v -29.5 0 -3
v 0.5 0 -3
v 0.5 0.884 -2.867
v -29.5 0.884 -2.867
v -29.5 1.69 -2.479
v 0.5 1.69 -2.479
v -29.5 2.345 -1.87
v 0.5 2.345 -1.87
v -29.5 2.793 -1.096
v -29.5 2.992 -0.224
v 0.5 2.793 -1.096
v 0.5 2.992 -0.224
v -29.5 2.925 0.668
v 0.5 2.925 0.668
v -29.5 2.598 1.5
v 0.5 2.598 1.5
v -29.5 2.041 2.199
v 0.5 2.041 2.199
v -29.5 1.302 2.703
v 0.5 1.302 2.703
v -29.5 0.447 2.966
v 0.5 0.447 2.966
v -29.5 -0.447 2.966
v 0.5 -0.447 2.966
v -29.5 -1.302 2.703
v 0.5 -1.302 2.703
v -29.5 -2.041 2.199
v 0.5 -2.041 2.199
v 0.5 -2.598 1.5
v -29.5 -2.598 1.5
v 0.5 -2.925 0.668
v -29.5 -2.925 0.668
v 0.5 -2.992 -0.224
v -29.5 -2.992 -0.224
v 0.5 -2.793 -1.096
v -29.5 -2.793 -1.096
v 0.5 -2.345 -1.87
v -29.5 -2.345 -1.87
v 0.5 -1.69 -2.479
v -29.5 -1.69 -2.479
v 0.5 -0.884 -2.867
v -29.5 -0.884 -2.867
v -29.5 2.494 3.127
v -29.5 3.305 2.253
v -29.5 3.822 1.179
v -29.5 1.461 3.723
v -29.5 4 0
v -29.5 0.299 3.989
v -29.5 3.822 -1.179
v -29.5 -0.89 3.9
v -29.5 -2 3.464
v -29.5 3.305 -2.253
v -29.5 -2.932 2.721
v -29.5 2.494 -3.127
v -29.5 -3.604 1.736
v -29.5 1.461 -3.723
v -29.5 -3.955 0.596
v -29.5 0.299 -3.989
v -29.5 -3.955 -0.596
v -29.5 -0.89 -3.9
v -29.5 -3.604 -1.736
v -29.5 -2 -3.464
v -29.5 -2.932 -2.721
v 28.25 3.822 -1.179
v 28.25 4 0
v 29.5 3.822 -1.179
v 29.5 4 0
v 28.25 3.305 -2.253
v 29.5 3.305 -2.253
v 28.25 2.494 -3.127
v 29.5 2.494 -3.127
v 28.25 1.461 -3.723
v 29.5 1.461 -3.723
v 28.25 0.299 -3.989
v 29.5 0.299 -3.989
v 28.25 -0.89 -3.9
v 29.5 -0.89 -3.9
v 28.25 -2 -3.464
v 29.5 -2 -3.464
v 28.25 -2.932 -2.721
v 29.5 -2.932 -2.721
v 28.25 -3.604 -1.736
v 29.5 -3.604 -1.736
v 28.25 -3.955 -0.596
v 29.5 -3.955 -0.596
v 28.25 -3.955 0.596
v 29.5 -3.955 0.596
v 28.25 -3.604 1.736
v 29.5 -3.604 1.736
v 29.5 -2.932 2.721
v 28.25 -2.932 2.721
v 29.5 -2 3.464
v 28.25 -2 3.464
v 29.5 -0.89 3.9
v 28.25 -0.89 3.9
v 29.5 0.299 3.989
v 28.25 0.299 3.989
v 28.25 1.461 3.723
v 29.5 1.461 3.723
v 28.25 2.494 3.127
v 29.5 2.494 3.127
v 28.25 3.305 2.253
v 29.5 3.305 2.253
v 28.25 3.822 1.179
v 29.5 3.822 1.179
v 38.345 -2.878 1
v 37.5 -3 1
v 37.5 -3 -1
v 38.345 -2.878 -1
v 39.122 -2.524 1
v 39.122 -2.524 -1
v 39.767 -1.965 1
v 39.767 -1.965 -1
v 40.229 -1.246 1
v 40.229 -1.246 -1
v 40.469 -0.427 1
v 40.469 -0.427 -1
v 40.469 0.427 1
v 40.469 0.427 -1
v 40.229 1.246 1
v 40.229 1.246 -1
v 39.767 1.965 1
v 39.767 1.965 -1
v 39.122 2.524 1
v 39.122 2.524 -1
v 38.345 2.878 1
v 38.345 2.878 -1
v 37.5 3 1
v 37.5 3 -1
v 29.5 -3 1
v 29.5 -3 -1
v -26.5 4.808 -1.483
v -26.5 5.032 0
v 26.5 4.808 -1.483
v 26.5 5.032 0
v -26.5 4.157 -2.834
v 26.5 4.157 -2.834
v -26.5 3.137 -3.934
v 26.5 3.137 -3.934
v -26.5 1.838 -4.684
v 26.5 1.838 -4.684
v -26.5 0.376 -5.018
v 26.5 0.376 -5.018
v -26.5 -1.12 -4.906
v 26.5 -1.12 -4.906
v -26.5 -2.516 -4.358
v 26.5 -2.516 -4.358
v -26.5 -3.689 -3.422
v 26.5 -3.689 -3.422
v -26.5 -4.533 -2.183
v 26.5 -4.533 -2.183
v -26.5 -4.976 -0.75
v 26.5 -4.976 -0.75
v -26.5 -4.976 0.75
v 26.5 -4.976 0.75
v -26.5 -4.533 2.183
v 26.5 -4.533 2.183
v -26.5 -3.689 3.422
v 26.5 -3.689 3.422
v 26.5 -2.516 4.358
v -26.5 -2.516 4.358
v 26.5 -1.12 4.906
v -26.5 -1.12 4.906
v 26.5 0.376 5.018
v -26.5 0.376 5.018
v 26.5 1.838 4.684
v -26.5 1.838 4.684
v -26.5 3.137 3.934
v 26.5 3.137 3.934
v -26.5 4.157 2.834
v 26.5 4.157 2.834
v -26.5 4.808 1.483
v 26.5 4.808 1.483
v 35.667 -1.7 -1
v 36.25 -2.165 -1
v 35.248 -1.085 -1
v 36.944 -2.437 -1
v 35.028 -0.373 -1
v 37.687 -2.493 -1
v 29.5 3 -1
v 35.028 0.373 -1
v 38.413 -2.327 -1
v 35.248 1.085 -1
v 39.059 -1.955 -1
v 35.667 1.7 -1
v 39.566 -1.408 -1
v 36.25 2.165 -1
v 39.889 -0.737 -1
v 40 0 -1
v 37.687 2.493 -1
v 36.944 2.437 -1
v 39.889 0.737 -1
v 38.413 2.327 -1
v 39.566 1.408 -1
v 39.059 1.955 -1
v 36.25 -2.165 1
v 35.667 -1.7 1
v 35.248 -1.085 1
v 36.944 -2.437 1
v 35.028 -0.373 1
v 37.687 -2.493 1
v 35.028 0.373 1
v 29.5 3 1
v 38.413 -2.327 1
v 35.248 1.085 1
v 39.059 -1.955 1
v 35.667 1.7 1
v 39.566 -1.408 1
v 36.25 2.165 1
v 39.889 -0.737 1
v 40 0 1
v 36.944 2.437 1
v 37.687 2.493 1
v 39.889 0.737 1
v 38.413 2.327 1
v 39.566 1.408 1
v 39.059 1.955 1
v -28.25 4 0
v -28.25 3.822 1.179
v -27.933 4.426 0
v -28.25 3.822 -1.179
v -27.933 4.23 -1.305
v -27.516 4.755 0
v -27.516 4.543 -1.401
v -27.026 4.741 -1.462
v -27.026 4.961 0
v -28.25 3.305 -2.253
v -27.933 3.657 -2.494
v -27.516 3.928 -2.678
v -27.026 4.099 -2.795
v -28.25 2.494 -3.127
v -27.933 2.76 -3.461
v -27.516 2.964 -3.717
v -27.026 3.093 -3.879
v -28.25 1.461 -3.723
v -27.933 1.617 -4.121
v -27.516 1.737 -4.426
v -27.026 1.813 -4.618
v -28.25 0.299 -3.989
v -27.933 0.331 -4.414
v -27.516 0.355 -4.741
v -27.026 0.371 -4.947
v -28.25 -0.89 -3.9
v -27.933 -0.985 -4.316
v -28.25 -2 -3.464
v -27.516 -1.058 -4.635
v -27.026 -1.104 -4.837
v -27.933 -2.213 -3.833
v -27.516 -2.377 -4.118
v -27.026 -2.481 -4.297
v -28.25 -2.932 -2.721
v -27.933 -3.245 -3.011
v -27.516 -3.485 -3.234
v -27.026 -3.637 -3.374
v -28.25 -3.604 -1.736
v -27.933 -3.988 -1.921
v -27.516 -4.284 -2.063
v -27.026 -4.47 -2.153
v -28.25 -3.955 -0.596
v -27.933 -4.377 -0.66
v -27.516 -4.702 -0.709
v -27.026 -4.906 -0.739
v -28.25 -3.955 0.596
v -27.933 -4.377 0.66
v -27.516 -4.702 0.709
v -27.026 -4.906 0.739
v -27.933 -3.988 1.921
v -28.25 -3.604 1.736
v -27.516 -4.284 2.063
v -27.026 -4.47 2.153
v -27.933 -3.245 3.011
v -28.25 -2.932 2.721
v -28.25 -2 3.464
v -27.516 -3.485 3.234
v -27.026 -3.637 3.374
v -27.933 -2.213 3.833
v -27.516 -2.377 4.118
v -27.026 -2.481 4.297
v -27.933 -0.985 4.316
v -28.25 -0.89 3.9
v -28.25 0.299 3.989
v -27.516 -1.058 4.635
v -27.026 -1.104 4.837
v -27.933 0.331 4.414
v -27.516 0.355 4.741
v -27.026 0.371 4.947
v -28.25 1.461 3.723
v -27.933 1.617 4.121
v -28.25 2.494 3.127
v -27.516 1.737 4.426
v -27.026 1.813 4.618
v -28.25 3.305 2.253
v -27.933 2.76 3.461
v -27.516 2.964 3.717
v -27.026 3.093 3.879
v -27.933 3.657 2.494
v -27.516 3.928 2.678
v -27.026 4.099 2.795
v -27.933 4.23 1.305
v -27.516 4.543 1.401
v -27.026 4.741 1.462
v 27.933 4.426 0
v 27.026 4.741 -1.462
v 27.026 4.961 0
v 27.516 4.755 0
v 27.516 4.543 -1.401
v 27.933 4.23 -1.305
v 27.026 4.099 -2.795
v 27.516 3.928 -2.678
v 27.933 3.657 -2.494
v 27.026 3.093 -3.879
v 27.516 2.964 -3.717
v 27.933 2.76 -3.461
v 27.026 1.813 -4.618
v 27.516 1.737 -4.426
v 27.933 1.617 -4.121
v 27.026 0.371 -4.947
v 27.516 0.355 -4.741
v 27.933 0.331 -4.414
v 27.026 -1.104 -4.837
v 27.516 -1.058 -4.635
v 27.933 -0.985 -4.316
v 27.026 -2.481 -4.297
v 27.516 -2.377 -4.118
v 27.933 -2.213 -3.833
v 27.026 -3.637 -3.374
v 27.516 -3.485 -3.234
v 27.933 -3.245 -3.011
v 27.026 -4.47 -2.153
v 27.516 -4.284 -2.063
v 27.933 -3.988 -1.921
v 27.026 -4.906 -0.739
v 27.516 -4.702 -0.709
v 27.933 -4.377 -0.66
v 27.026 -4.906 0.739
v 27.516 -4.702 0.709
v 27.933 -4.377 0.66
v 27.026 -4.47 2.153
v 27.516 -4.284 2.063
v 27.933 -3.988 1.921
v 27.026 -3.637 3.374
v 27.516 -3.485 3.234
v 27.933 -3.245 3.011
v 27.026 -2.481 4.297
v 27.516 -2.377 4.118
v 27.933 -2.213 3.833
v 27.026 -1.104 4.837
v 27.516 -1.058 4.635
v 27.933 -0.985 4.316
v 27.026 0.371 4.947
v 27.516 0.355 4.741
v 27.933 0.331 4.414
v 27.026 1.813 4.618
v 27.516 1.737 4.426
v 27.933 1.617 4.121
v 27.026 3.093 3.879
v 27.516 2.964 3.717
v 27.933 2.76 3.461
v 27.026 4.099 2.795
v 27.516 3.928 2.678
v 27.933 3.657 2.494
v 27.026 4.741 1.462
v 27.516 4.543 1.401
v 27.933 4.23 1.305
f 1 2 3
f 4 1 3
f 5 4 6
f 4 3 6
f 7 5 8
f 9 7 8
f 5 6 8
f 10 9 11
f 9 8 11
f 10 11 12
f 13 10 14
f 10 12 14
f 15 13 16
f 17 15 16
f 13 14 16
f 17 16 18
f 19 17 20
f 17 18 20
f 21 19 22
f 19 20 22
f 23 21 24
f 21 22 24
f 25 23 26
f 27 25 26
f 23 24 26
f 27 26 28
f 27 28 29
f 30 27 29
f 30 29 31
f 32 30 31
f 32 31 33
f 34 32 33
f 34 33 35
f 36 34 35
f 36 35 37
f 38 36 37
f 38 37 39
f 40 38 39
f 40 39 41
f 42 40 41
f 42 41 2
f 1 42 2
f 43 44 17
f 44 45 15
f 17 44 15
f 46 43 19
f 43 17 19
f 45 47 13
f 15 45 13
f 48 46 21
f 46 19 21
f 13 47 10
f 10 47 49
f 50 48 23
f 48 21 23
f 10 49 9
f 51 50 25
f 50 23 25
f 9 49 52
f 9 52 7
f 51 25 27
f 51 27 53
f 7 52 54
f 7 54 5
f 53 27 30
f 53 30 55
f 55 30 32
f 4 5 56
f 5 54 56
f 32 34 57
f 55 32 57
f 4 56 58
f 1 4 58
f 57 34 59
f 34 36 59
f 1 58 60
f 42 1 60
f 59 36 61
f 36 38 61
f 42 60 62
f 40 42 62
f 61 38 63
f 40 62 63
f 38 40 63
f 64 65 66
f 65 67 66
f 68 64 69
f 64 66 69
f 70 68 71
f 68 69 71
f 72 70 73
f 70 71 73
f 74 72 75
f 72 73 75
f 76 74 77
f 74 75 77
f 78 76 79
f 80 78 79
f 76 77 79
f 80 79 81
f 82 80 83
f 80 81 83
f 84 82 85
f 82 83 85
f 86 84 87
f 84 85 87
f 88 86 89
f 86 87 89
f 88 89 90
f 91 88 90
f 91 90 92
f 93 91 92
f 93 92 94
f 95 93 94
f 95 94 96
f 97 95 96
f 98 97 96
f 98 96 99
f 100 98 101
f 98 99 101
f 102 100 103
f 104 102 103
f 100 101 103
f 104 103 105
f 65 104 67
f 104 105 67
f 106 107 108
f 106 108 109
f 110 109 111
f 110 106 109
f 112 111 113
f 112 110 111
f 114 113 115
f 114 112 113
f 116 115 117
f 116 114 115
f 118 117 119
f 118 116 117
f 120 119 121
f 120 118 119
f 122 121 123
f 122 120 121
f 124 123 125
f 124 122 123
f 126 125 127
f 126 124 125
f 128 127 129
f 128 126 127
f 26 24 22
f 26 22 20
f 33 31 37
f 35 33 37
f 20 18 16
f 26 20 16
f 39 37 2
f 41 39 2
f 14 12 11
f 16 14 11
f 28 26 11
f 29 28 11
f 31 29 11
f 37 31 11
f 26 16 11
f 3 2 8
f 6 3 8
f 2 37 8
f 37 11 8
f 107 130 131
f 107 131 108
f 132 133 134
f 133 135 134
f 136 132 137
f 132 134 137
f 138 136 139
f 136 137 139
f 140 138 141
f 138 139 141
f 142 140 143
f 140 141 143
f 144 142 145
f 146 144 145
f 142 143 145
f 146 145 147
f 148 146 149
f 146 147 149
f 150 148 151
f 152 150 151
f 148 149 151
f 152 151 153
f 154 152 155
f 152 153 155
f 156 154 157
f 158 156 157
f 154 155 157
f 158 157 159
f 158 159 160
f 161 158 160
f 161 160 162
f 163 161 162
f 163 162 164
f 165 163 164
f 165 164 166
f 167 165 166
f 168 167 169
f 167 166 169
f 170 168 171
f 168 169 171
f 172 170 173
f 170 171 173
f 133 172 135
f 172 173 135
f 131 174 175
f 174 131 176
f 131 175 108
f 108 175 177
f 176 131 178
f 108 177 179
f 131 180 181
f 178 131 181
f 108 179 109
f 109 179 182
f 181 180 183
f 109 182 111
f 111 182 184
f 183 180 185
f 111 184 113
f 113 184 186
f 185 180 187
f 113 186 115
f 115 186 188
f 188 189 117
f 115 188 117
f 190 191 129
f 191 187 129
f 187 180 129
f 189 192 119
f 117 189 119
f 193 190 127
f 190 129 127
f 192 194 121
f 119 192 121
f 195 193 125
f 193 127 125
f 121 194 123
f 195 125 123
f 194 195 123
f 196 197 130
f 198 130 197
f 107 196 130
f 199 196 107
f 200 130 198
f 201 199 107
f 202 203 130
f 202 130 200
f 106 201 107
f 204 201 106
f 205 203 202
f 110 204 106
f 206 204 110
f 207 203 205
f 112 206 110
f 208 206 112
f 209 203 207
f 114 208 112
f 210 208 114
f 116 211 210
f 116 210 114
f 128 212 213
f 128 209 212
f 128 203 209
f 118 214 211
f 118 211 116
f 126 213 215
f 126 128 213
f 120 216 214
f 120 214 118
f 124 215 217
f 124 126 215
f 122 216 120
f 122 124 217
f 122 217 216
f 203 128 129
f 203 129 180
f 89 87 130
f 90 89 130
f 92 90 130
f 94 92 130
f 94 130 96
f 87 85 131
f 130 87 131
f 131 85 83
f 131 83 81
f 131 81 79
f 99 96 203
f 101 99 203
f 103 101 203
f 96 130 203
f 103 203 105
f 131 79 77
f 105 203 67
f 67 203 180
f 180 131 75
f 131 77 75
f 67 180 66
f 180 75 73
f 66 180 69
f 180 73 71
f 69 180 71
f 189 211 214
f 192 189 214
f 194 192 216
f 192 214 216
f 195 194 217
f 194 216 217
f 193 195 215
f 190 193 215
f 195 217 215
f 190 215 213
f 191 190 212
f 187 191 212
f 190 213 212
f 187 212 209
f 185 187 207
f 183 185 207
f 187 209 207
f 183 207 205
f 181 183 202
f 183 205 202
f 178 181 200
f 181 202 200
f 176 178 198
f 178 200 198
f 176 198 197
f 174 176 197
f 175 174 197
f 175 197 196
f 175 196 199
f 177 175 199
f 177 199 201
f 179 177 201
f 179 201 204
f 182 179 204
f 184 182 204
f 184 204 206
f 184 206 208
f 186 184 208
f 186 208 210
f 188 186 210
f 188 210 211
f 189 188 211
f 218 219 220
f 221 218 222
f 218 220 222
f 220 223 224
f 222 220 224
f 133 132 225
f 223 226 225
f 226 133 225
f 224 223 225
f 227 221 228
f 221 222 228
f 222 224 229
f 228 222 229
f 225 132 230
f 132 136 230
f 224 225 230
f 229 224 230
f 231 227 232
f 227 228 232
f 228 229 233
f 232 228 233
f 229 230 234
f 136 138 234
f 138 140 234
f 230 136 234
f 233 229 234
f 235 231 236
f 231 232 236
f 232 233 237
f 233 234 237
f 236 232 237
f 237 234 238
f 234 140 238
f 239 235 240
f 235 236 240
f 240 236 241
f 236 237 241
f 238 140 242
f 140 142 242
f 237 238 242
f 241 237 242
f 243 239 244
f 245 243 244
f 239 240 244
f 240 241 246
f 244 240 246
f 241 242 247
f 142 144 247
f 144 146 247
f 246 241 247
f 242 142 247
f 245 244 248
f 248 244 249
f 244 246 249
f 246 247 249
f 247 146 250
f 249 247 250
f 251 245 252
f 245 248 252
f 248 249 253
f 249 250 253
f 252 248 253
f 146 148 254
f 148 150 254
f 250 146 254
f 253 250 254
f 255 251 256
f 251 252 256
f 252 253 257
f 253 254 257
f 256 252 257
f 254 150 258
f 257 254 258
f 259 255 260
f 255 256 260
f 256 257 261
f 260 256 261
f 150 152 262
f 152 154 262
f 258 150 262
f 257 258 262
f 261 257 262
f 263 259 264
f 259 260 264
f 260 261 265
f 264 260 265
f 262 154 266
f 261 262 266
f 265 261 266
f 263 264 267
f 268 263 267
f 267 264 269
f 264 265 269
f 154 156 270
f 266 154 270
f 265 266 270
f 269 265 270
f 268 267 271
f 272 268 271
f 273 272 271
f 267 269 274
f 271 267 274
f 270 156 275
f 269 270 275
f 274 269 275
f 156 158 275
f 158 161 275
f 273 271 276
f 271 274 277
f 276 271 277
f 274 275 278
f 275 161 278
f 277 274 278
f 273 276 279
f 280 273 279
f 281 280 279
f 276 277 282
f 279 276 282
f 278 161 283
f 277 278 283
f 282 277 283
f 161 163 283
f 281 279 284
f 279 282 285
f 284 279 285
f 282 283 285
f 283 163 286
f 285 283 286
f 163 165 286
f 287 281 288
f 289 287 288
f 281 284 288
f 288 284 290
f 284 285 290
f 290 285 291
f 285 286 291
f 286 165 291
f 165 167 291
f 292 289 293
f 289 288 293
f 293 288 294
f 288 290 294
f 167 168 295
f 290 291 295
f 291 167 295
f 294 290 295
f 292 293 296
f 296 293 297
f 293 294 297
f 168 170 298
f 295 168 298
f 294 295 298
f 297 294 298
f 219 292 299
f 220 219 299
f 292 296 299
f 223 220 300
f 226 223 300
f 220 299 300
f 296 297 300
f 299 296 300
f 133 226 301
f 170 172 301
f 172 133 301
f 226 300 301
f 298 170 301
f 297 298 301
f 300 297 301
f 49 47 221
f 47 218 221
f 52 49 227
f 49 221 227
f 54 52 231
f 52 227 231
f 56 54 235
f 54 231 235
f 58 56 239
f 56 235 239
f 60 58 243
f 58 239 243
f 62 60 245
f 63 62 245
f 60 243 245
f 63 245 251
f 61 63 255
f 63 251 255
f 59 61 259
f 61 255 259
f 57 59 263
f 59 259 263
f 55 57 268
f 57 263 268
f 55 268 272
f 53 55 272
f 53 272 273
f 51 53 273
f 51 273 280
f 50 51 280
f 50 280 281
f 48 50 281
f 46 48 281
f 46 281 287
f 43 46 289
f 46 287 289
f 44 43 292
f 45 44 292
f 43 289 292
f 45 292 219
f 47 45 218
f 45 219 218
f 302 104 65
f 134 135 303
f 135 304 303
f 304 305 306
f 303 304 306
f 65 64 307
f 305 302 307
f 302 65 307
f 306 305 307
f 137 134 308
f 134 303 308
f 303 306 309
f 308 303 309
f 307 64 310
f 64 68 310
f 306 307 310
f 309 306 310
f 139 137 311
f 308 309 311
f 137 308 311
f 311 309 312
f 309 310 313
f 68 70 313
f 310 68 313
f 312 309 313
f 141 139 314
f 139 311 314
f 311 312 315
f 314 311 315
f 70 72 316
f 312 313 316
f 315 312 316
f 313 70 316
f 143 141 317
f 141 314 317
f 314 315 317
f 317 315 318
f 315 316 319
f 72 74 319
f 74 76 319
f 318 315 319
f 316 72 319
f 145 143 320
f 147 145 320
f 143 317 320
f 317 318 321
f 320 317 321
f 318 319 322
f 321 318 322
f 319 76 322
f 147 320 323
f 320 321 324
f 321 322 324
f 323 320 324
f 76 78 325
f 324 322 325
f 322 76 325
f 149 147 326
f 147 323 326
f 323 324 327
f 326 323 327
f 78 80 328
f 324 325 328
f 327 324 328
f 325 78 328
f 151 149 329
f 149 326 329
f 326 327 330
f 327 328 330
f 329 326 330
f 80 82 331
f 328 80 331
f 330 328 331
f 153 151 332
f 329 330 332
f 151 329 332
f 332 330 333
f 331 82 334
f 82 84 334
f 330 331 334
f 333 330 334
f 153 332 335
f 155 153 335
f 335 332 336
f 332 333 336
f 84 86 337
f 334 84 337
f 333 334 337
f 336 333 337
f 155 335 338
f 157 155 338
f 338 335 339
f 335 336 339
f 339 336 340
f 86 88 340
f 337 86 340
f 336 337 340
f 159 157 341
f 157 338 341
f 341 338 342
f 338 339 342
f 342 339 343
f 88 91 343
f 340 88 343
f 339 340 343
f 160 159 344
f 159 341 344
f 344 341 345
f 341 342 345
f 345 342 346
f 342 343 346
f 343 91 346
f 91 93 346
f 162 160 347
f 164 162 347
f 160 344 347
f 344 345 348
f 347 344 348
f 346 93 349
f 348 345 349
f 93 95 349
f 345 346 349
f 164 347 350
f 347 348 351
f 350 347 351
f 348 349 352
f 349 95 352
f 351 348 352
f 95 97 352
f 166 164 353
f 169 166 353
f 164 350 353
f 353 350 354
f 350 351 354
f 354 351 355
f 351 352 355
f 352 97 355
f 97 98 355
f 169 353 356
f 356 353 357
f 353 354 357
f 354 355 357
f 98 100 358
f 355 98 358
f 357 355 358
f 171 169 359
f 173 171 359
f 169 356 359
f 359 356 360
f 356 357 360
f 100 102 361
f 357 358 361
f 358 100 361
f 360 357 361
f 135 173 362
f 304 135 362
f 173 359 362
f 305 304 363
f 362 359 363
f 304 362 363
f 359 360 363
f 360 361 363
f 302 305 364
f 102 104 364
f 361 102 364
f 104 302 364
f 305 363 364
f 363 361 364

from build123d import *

# Parameters (mm, degrees)
BOSS_EXTRUDE1_DEPTH          = 2
F_6_0_6_DIAMETER_HOLE1_D     = 6
F_6_0_6_DIAMETER_HOLE1_DEPTH = 30
F_5_0_5_DIAMETER_HOLE1_D     = 5
F_5_0_5_DIAMETER_HOLE1_DEPTH = 6.031754163


with BuildPart() as part:
    # Sketch1 → Revolve1 (revolve)
    with BuildSketch(Plane(origin=(0, 0, 0), x_dir=(-1, 0, 0), z_dir=(0, 0, -1))):
        with BuildLine():
            Line((-29.5, 4), (-29.5, 0))
            Line((-29.5, 0), (29.5, 0))
            Line((29.5, 0), (29.5, 4))
            Line((29.5, 4), (28.25, 4))
            ThreePointArc((28.25, 4), (27.515753003, 4.754613948), (26.5, 5.031754163))
            Line((26.5, 5.031754163), (-26.5, 5.031754163))
            ThreePointArc((-26.5, 5.031754163), (-27.515753003, 4.754613948), (-28.25, 4))
            Line((-28.25, 4), (-29.5, 4))
        make_face()
    revolve(axis=Axis((29.5, 0, 0), (-1, 0, 0)))

    # Sketch2 → Boss-Extrude1 (add)
    with BuildSketch(Plane.XY.offset(1)):
        with BuildLine():
            Line((37.5, 3), (29.5, 3))
            Line((29.5, 3), (29.5, -3))
            Line((29.5, -3), (37.5, -3))
            ThreePointArc((37.5, -3), (40.5, 0), (37.5, 3))
        make_face()
    extrude(amount=-BOSS_EXTRUDE1_DEPTH)

    # Ø6.0 (6) Diameter Hole1
    with Locations(Plane.ZY.offset(29.5)):
        with Locations((0, 0)):
            Hole(F_6_0_6_DIAMETER_HOLE1_D / 2, depth=F_6_0_6_DIAMETER_HOLE1_DEPTH)

    # Ø5.0 (5) Diameter Hole1
    with Locations(Plane(origin=(0, 0, -1), x_dir=(-1, 0, 0), z_dir=(0, 0, -1))):
        with Locations((-37.5, 0)):
            Hole(F_5_0_5_DIAMETER_HOLE1_D / 2, depth=F_5_0_5_DIAMETER_HOLE1_DEPTH)


solid = part.part
